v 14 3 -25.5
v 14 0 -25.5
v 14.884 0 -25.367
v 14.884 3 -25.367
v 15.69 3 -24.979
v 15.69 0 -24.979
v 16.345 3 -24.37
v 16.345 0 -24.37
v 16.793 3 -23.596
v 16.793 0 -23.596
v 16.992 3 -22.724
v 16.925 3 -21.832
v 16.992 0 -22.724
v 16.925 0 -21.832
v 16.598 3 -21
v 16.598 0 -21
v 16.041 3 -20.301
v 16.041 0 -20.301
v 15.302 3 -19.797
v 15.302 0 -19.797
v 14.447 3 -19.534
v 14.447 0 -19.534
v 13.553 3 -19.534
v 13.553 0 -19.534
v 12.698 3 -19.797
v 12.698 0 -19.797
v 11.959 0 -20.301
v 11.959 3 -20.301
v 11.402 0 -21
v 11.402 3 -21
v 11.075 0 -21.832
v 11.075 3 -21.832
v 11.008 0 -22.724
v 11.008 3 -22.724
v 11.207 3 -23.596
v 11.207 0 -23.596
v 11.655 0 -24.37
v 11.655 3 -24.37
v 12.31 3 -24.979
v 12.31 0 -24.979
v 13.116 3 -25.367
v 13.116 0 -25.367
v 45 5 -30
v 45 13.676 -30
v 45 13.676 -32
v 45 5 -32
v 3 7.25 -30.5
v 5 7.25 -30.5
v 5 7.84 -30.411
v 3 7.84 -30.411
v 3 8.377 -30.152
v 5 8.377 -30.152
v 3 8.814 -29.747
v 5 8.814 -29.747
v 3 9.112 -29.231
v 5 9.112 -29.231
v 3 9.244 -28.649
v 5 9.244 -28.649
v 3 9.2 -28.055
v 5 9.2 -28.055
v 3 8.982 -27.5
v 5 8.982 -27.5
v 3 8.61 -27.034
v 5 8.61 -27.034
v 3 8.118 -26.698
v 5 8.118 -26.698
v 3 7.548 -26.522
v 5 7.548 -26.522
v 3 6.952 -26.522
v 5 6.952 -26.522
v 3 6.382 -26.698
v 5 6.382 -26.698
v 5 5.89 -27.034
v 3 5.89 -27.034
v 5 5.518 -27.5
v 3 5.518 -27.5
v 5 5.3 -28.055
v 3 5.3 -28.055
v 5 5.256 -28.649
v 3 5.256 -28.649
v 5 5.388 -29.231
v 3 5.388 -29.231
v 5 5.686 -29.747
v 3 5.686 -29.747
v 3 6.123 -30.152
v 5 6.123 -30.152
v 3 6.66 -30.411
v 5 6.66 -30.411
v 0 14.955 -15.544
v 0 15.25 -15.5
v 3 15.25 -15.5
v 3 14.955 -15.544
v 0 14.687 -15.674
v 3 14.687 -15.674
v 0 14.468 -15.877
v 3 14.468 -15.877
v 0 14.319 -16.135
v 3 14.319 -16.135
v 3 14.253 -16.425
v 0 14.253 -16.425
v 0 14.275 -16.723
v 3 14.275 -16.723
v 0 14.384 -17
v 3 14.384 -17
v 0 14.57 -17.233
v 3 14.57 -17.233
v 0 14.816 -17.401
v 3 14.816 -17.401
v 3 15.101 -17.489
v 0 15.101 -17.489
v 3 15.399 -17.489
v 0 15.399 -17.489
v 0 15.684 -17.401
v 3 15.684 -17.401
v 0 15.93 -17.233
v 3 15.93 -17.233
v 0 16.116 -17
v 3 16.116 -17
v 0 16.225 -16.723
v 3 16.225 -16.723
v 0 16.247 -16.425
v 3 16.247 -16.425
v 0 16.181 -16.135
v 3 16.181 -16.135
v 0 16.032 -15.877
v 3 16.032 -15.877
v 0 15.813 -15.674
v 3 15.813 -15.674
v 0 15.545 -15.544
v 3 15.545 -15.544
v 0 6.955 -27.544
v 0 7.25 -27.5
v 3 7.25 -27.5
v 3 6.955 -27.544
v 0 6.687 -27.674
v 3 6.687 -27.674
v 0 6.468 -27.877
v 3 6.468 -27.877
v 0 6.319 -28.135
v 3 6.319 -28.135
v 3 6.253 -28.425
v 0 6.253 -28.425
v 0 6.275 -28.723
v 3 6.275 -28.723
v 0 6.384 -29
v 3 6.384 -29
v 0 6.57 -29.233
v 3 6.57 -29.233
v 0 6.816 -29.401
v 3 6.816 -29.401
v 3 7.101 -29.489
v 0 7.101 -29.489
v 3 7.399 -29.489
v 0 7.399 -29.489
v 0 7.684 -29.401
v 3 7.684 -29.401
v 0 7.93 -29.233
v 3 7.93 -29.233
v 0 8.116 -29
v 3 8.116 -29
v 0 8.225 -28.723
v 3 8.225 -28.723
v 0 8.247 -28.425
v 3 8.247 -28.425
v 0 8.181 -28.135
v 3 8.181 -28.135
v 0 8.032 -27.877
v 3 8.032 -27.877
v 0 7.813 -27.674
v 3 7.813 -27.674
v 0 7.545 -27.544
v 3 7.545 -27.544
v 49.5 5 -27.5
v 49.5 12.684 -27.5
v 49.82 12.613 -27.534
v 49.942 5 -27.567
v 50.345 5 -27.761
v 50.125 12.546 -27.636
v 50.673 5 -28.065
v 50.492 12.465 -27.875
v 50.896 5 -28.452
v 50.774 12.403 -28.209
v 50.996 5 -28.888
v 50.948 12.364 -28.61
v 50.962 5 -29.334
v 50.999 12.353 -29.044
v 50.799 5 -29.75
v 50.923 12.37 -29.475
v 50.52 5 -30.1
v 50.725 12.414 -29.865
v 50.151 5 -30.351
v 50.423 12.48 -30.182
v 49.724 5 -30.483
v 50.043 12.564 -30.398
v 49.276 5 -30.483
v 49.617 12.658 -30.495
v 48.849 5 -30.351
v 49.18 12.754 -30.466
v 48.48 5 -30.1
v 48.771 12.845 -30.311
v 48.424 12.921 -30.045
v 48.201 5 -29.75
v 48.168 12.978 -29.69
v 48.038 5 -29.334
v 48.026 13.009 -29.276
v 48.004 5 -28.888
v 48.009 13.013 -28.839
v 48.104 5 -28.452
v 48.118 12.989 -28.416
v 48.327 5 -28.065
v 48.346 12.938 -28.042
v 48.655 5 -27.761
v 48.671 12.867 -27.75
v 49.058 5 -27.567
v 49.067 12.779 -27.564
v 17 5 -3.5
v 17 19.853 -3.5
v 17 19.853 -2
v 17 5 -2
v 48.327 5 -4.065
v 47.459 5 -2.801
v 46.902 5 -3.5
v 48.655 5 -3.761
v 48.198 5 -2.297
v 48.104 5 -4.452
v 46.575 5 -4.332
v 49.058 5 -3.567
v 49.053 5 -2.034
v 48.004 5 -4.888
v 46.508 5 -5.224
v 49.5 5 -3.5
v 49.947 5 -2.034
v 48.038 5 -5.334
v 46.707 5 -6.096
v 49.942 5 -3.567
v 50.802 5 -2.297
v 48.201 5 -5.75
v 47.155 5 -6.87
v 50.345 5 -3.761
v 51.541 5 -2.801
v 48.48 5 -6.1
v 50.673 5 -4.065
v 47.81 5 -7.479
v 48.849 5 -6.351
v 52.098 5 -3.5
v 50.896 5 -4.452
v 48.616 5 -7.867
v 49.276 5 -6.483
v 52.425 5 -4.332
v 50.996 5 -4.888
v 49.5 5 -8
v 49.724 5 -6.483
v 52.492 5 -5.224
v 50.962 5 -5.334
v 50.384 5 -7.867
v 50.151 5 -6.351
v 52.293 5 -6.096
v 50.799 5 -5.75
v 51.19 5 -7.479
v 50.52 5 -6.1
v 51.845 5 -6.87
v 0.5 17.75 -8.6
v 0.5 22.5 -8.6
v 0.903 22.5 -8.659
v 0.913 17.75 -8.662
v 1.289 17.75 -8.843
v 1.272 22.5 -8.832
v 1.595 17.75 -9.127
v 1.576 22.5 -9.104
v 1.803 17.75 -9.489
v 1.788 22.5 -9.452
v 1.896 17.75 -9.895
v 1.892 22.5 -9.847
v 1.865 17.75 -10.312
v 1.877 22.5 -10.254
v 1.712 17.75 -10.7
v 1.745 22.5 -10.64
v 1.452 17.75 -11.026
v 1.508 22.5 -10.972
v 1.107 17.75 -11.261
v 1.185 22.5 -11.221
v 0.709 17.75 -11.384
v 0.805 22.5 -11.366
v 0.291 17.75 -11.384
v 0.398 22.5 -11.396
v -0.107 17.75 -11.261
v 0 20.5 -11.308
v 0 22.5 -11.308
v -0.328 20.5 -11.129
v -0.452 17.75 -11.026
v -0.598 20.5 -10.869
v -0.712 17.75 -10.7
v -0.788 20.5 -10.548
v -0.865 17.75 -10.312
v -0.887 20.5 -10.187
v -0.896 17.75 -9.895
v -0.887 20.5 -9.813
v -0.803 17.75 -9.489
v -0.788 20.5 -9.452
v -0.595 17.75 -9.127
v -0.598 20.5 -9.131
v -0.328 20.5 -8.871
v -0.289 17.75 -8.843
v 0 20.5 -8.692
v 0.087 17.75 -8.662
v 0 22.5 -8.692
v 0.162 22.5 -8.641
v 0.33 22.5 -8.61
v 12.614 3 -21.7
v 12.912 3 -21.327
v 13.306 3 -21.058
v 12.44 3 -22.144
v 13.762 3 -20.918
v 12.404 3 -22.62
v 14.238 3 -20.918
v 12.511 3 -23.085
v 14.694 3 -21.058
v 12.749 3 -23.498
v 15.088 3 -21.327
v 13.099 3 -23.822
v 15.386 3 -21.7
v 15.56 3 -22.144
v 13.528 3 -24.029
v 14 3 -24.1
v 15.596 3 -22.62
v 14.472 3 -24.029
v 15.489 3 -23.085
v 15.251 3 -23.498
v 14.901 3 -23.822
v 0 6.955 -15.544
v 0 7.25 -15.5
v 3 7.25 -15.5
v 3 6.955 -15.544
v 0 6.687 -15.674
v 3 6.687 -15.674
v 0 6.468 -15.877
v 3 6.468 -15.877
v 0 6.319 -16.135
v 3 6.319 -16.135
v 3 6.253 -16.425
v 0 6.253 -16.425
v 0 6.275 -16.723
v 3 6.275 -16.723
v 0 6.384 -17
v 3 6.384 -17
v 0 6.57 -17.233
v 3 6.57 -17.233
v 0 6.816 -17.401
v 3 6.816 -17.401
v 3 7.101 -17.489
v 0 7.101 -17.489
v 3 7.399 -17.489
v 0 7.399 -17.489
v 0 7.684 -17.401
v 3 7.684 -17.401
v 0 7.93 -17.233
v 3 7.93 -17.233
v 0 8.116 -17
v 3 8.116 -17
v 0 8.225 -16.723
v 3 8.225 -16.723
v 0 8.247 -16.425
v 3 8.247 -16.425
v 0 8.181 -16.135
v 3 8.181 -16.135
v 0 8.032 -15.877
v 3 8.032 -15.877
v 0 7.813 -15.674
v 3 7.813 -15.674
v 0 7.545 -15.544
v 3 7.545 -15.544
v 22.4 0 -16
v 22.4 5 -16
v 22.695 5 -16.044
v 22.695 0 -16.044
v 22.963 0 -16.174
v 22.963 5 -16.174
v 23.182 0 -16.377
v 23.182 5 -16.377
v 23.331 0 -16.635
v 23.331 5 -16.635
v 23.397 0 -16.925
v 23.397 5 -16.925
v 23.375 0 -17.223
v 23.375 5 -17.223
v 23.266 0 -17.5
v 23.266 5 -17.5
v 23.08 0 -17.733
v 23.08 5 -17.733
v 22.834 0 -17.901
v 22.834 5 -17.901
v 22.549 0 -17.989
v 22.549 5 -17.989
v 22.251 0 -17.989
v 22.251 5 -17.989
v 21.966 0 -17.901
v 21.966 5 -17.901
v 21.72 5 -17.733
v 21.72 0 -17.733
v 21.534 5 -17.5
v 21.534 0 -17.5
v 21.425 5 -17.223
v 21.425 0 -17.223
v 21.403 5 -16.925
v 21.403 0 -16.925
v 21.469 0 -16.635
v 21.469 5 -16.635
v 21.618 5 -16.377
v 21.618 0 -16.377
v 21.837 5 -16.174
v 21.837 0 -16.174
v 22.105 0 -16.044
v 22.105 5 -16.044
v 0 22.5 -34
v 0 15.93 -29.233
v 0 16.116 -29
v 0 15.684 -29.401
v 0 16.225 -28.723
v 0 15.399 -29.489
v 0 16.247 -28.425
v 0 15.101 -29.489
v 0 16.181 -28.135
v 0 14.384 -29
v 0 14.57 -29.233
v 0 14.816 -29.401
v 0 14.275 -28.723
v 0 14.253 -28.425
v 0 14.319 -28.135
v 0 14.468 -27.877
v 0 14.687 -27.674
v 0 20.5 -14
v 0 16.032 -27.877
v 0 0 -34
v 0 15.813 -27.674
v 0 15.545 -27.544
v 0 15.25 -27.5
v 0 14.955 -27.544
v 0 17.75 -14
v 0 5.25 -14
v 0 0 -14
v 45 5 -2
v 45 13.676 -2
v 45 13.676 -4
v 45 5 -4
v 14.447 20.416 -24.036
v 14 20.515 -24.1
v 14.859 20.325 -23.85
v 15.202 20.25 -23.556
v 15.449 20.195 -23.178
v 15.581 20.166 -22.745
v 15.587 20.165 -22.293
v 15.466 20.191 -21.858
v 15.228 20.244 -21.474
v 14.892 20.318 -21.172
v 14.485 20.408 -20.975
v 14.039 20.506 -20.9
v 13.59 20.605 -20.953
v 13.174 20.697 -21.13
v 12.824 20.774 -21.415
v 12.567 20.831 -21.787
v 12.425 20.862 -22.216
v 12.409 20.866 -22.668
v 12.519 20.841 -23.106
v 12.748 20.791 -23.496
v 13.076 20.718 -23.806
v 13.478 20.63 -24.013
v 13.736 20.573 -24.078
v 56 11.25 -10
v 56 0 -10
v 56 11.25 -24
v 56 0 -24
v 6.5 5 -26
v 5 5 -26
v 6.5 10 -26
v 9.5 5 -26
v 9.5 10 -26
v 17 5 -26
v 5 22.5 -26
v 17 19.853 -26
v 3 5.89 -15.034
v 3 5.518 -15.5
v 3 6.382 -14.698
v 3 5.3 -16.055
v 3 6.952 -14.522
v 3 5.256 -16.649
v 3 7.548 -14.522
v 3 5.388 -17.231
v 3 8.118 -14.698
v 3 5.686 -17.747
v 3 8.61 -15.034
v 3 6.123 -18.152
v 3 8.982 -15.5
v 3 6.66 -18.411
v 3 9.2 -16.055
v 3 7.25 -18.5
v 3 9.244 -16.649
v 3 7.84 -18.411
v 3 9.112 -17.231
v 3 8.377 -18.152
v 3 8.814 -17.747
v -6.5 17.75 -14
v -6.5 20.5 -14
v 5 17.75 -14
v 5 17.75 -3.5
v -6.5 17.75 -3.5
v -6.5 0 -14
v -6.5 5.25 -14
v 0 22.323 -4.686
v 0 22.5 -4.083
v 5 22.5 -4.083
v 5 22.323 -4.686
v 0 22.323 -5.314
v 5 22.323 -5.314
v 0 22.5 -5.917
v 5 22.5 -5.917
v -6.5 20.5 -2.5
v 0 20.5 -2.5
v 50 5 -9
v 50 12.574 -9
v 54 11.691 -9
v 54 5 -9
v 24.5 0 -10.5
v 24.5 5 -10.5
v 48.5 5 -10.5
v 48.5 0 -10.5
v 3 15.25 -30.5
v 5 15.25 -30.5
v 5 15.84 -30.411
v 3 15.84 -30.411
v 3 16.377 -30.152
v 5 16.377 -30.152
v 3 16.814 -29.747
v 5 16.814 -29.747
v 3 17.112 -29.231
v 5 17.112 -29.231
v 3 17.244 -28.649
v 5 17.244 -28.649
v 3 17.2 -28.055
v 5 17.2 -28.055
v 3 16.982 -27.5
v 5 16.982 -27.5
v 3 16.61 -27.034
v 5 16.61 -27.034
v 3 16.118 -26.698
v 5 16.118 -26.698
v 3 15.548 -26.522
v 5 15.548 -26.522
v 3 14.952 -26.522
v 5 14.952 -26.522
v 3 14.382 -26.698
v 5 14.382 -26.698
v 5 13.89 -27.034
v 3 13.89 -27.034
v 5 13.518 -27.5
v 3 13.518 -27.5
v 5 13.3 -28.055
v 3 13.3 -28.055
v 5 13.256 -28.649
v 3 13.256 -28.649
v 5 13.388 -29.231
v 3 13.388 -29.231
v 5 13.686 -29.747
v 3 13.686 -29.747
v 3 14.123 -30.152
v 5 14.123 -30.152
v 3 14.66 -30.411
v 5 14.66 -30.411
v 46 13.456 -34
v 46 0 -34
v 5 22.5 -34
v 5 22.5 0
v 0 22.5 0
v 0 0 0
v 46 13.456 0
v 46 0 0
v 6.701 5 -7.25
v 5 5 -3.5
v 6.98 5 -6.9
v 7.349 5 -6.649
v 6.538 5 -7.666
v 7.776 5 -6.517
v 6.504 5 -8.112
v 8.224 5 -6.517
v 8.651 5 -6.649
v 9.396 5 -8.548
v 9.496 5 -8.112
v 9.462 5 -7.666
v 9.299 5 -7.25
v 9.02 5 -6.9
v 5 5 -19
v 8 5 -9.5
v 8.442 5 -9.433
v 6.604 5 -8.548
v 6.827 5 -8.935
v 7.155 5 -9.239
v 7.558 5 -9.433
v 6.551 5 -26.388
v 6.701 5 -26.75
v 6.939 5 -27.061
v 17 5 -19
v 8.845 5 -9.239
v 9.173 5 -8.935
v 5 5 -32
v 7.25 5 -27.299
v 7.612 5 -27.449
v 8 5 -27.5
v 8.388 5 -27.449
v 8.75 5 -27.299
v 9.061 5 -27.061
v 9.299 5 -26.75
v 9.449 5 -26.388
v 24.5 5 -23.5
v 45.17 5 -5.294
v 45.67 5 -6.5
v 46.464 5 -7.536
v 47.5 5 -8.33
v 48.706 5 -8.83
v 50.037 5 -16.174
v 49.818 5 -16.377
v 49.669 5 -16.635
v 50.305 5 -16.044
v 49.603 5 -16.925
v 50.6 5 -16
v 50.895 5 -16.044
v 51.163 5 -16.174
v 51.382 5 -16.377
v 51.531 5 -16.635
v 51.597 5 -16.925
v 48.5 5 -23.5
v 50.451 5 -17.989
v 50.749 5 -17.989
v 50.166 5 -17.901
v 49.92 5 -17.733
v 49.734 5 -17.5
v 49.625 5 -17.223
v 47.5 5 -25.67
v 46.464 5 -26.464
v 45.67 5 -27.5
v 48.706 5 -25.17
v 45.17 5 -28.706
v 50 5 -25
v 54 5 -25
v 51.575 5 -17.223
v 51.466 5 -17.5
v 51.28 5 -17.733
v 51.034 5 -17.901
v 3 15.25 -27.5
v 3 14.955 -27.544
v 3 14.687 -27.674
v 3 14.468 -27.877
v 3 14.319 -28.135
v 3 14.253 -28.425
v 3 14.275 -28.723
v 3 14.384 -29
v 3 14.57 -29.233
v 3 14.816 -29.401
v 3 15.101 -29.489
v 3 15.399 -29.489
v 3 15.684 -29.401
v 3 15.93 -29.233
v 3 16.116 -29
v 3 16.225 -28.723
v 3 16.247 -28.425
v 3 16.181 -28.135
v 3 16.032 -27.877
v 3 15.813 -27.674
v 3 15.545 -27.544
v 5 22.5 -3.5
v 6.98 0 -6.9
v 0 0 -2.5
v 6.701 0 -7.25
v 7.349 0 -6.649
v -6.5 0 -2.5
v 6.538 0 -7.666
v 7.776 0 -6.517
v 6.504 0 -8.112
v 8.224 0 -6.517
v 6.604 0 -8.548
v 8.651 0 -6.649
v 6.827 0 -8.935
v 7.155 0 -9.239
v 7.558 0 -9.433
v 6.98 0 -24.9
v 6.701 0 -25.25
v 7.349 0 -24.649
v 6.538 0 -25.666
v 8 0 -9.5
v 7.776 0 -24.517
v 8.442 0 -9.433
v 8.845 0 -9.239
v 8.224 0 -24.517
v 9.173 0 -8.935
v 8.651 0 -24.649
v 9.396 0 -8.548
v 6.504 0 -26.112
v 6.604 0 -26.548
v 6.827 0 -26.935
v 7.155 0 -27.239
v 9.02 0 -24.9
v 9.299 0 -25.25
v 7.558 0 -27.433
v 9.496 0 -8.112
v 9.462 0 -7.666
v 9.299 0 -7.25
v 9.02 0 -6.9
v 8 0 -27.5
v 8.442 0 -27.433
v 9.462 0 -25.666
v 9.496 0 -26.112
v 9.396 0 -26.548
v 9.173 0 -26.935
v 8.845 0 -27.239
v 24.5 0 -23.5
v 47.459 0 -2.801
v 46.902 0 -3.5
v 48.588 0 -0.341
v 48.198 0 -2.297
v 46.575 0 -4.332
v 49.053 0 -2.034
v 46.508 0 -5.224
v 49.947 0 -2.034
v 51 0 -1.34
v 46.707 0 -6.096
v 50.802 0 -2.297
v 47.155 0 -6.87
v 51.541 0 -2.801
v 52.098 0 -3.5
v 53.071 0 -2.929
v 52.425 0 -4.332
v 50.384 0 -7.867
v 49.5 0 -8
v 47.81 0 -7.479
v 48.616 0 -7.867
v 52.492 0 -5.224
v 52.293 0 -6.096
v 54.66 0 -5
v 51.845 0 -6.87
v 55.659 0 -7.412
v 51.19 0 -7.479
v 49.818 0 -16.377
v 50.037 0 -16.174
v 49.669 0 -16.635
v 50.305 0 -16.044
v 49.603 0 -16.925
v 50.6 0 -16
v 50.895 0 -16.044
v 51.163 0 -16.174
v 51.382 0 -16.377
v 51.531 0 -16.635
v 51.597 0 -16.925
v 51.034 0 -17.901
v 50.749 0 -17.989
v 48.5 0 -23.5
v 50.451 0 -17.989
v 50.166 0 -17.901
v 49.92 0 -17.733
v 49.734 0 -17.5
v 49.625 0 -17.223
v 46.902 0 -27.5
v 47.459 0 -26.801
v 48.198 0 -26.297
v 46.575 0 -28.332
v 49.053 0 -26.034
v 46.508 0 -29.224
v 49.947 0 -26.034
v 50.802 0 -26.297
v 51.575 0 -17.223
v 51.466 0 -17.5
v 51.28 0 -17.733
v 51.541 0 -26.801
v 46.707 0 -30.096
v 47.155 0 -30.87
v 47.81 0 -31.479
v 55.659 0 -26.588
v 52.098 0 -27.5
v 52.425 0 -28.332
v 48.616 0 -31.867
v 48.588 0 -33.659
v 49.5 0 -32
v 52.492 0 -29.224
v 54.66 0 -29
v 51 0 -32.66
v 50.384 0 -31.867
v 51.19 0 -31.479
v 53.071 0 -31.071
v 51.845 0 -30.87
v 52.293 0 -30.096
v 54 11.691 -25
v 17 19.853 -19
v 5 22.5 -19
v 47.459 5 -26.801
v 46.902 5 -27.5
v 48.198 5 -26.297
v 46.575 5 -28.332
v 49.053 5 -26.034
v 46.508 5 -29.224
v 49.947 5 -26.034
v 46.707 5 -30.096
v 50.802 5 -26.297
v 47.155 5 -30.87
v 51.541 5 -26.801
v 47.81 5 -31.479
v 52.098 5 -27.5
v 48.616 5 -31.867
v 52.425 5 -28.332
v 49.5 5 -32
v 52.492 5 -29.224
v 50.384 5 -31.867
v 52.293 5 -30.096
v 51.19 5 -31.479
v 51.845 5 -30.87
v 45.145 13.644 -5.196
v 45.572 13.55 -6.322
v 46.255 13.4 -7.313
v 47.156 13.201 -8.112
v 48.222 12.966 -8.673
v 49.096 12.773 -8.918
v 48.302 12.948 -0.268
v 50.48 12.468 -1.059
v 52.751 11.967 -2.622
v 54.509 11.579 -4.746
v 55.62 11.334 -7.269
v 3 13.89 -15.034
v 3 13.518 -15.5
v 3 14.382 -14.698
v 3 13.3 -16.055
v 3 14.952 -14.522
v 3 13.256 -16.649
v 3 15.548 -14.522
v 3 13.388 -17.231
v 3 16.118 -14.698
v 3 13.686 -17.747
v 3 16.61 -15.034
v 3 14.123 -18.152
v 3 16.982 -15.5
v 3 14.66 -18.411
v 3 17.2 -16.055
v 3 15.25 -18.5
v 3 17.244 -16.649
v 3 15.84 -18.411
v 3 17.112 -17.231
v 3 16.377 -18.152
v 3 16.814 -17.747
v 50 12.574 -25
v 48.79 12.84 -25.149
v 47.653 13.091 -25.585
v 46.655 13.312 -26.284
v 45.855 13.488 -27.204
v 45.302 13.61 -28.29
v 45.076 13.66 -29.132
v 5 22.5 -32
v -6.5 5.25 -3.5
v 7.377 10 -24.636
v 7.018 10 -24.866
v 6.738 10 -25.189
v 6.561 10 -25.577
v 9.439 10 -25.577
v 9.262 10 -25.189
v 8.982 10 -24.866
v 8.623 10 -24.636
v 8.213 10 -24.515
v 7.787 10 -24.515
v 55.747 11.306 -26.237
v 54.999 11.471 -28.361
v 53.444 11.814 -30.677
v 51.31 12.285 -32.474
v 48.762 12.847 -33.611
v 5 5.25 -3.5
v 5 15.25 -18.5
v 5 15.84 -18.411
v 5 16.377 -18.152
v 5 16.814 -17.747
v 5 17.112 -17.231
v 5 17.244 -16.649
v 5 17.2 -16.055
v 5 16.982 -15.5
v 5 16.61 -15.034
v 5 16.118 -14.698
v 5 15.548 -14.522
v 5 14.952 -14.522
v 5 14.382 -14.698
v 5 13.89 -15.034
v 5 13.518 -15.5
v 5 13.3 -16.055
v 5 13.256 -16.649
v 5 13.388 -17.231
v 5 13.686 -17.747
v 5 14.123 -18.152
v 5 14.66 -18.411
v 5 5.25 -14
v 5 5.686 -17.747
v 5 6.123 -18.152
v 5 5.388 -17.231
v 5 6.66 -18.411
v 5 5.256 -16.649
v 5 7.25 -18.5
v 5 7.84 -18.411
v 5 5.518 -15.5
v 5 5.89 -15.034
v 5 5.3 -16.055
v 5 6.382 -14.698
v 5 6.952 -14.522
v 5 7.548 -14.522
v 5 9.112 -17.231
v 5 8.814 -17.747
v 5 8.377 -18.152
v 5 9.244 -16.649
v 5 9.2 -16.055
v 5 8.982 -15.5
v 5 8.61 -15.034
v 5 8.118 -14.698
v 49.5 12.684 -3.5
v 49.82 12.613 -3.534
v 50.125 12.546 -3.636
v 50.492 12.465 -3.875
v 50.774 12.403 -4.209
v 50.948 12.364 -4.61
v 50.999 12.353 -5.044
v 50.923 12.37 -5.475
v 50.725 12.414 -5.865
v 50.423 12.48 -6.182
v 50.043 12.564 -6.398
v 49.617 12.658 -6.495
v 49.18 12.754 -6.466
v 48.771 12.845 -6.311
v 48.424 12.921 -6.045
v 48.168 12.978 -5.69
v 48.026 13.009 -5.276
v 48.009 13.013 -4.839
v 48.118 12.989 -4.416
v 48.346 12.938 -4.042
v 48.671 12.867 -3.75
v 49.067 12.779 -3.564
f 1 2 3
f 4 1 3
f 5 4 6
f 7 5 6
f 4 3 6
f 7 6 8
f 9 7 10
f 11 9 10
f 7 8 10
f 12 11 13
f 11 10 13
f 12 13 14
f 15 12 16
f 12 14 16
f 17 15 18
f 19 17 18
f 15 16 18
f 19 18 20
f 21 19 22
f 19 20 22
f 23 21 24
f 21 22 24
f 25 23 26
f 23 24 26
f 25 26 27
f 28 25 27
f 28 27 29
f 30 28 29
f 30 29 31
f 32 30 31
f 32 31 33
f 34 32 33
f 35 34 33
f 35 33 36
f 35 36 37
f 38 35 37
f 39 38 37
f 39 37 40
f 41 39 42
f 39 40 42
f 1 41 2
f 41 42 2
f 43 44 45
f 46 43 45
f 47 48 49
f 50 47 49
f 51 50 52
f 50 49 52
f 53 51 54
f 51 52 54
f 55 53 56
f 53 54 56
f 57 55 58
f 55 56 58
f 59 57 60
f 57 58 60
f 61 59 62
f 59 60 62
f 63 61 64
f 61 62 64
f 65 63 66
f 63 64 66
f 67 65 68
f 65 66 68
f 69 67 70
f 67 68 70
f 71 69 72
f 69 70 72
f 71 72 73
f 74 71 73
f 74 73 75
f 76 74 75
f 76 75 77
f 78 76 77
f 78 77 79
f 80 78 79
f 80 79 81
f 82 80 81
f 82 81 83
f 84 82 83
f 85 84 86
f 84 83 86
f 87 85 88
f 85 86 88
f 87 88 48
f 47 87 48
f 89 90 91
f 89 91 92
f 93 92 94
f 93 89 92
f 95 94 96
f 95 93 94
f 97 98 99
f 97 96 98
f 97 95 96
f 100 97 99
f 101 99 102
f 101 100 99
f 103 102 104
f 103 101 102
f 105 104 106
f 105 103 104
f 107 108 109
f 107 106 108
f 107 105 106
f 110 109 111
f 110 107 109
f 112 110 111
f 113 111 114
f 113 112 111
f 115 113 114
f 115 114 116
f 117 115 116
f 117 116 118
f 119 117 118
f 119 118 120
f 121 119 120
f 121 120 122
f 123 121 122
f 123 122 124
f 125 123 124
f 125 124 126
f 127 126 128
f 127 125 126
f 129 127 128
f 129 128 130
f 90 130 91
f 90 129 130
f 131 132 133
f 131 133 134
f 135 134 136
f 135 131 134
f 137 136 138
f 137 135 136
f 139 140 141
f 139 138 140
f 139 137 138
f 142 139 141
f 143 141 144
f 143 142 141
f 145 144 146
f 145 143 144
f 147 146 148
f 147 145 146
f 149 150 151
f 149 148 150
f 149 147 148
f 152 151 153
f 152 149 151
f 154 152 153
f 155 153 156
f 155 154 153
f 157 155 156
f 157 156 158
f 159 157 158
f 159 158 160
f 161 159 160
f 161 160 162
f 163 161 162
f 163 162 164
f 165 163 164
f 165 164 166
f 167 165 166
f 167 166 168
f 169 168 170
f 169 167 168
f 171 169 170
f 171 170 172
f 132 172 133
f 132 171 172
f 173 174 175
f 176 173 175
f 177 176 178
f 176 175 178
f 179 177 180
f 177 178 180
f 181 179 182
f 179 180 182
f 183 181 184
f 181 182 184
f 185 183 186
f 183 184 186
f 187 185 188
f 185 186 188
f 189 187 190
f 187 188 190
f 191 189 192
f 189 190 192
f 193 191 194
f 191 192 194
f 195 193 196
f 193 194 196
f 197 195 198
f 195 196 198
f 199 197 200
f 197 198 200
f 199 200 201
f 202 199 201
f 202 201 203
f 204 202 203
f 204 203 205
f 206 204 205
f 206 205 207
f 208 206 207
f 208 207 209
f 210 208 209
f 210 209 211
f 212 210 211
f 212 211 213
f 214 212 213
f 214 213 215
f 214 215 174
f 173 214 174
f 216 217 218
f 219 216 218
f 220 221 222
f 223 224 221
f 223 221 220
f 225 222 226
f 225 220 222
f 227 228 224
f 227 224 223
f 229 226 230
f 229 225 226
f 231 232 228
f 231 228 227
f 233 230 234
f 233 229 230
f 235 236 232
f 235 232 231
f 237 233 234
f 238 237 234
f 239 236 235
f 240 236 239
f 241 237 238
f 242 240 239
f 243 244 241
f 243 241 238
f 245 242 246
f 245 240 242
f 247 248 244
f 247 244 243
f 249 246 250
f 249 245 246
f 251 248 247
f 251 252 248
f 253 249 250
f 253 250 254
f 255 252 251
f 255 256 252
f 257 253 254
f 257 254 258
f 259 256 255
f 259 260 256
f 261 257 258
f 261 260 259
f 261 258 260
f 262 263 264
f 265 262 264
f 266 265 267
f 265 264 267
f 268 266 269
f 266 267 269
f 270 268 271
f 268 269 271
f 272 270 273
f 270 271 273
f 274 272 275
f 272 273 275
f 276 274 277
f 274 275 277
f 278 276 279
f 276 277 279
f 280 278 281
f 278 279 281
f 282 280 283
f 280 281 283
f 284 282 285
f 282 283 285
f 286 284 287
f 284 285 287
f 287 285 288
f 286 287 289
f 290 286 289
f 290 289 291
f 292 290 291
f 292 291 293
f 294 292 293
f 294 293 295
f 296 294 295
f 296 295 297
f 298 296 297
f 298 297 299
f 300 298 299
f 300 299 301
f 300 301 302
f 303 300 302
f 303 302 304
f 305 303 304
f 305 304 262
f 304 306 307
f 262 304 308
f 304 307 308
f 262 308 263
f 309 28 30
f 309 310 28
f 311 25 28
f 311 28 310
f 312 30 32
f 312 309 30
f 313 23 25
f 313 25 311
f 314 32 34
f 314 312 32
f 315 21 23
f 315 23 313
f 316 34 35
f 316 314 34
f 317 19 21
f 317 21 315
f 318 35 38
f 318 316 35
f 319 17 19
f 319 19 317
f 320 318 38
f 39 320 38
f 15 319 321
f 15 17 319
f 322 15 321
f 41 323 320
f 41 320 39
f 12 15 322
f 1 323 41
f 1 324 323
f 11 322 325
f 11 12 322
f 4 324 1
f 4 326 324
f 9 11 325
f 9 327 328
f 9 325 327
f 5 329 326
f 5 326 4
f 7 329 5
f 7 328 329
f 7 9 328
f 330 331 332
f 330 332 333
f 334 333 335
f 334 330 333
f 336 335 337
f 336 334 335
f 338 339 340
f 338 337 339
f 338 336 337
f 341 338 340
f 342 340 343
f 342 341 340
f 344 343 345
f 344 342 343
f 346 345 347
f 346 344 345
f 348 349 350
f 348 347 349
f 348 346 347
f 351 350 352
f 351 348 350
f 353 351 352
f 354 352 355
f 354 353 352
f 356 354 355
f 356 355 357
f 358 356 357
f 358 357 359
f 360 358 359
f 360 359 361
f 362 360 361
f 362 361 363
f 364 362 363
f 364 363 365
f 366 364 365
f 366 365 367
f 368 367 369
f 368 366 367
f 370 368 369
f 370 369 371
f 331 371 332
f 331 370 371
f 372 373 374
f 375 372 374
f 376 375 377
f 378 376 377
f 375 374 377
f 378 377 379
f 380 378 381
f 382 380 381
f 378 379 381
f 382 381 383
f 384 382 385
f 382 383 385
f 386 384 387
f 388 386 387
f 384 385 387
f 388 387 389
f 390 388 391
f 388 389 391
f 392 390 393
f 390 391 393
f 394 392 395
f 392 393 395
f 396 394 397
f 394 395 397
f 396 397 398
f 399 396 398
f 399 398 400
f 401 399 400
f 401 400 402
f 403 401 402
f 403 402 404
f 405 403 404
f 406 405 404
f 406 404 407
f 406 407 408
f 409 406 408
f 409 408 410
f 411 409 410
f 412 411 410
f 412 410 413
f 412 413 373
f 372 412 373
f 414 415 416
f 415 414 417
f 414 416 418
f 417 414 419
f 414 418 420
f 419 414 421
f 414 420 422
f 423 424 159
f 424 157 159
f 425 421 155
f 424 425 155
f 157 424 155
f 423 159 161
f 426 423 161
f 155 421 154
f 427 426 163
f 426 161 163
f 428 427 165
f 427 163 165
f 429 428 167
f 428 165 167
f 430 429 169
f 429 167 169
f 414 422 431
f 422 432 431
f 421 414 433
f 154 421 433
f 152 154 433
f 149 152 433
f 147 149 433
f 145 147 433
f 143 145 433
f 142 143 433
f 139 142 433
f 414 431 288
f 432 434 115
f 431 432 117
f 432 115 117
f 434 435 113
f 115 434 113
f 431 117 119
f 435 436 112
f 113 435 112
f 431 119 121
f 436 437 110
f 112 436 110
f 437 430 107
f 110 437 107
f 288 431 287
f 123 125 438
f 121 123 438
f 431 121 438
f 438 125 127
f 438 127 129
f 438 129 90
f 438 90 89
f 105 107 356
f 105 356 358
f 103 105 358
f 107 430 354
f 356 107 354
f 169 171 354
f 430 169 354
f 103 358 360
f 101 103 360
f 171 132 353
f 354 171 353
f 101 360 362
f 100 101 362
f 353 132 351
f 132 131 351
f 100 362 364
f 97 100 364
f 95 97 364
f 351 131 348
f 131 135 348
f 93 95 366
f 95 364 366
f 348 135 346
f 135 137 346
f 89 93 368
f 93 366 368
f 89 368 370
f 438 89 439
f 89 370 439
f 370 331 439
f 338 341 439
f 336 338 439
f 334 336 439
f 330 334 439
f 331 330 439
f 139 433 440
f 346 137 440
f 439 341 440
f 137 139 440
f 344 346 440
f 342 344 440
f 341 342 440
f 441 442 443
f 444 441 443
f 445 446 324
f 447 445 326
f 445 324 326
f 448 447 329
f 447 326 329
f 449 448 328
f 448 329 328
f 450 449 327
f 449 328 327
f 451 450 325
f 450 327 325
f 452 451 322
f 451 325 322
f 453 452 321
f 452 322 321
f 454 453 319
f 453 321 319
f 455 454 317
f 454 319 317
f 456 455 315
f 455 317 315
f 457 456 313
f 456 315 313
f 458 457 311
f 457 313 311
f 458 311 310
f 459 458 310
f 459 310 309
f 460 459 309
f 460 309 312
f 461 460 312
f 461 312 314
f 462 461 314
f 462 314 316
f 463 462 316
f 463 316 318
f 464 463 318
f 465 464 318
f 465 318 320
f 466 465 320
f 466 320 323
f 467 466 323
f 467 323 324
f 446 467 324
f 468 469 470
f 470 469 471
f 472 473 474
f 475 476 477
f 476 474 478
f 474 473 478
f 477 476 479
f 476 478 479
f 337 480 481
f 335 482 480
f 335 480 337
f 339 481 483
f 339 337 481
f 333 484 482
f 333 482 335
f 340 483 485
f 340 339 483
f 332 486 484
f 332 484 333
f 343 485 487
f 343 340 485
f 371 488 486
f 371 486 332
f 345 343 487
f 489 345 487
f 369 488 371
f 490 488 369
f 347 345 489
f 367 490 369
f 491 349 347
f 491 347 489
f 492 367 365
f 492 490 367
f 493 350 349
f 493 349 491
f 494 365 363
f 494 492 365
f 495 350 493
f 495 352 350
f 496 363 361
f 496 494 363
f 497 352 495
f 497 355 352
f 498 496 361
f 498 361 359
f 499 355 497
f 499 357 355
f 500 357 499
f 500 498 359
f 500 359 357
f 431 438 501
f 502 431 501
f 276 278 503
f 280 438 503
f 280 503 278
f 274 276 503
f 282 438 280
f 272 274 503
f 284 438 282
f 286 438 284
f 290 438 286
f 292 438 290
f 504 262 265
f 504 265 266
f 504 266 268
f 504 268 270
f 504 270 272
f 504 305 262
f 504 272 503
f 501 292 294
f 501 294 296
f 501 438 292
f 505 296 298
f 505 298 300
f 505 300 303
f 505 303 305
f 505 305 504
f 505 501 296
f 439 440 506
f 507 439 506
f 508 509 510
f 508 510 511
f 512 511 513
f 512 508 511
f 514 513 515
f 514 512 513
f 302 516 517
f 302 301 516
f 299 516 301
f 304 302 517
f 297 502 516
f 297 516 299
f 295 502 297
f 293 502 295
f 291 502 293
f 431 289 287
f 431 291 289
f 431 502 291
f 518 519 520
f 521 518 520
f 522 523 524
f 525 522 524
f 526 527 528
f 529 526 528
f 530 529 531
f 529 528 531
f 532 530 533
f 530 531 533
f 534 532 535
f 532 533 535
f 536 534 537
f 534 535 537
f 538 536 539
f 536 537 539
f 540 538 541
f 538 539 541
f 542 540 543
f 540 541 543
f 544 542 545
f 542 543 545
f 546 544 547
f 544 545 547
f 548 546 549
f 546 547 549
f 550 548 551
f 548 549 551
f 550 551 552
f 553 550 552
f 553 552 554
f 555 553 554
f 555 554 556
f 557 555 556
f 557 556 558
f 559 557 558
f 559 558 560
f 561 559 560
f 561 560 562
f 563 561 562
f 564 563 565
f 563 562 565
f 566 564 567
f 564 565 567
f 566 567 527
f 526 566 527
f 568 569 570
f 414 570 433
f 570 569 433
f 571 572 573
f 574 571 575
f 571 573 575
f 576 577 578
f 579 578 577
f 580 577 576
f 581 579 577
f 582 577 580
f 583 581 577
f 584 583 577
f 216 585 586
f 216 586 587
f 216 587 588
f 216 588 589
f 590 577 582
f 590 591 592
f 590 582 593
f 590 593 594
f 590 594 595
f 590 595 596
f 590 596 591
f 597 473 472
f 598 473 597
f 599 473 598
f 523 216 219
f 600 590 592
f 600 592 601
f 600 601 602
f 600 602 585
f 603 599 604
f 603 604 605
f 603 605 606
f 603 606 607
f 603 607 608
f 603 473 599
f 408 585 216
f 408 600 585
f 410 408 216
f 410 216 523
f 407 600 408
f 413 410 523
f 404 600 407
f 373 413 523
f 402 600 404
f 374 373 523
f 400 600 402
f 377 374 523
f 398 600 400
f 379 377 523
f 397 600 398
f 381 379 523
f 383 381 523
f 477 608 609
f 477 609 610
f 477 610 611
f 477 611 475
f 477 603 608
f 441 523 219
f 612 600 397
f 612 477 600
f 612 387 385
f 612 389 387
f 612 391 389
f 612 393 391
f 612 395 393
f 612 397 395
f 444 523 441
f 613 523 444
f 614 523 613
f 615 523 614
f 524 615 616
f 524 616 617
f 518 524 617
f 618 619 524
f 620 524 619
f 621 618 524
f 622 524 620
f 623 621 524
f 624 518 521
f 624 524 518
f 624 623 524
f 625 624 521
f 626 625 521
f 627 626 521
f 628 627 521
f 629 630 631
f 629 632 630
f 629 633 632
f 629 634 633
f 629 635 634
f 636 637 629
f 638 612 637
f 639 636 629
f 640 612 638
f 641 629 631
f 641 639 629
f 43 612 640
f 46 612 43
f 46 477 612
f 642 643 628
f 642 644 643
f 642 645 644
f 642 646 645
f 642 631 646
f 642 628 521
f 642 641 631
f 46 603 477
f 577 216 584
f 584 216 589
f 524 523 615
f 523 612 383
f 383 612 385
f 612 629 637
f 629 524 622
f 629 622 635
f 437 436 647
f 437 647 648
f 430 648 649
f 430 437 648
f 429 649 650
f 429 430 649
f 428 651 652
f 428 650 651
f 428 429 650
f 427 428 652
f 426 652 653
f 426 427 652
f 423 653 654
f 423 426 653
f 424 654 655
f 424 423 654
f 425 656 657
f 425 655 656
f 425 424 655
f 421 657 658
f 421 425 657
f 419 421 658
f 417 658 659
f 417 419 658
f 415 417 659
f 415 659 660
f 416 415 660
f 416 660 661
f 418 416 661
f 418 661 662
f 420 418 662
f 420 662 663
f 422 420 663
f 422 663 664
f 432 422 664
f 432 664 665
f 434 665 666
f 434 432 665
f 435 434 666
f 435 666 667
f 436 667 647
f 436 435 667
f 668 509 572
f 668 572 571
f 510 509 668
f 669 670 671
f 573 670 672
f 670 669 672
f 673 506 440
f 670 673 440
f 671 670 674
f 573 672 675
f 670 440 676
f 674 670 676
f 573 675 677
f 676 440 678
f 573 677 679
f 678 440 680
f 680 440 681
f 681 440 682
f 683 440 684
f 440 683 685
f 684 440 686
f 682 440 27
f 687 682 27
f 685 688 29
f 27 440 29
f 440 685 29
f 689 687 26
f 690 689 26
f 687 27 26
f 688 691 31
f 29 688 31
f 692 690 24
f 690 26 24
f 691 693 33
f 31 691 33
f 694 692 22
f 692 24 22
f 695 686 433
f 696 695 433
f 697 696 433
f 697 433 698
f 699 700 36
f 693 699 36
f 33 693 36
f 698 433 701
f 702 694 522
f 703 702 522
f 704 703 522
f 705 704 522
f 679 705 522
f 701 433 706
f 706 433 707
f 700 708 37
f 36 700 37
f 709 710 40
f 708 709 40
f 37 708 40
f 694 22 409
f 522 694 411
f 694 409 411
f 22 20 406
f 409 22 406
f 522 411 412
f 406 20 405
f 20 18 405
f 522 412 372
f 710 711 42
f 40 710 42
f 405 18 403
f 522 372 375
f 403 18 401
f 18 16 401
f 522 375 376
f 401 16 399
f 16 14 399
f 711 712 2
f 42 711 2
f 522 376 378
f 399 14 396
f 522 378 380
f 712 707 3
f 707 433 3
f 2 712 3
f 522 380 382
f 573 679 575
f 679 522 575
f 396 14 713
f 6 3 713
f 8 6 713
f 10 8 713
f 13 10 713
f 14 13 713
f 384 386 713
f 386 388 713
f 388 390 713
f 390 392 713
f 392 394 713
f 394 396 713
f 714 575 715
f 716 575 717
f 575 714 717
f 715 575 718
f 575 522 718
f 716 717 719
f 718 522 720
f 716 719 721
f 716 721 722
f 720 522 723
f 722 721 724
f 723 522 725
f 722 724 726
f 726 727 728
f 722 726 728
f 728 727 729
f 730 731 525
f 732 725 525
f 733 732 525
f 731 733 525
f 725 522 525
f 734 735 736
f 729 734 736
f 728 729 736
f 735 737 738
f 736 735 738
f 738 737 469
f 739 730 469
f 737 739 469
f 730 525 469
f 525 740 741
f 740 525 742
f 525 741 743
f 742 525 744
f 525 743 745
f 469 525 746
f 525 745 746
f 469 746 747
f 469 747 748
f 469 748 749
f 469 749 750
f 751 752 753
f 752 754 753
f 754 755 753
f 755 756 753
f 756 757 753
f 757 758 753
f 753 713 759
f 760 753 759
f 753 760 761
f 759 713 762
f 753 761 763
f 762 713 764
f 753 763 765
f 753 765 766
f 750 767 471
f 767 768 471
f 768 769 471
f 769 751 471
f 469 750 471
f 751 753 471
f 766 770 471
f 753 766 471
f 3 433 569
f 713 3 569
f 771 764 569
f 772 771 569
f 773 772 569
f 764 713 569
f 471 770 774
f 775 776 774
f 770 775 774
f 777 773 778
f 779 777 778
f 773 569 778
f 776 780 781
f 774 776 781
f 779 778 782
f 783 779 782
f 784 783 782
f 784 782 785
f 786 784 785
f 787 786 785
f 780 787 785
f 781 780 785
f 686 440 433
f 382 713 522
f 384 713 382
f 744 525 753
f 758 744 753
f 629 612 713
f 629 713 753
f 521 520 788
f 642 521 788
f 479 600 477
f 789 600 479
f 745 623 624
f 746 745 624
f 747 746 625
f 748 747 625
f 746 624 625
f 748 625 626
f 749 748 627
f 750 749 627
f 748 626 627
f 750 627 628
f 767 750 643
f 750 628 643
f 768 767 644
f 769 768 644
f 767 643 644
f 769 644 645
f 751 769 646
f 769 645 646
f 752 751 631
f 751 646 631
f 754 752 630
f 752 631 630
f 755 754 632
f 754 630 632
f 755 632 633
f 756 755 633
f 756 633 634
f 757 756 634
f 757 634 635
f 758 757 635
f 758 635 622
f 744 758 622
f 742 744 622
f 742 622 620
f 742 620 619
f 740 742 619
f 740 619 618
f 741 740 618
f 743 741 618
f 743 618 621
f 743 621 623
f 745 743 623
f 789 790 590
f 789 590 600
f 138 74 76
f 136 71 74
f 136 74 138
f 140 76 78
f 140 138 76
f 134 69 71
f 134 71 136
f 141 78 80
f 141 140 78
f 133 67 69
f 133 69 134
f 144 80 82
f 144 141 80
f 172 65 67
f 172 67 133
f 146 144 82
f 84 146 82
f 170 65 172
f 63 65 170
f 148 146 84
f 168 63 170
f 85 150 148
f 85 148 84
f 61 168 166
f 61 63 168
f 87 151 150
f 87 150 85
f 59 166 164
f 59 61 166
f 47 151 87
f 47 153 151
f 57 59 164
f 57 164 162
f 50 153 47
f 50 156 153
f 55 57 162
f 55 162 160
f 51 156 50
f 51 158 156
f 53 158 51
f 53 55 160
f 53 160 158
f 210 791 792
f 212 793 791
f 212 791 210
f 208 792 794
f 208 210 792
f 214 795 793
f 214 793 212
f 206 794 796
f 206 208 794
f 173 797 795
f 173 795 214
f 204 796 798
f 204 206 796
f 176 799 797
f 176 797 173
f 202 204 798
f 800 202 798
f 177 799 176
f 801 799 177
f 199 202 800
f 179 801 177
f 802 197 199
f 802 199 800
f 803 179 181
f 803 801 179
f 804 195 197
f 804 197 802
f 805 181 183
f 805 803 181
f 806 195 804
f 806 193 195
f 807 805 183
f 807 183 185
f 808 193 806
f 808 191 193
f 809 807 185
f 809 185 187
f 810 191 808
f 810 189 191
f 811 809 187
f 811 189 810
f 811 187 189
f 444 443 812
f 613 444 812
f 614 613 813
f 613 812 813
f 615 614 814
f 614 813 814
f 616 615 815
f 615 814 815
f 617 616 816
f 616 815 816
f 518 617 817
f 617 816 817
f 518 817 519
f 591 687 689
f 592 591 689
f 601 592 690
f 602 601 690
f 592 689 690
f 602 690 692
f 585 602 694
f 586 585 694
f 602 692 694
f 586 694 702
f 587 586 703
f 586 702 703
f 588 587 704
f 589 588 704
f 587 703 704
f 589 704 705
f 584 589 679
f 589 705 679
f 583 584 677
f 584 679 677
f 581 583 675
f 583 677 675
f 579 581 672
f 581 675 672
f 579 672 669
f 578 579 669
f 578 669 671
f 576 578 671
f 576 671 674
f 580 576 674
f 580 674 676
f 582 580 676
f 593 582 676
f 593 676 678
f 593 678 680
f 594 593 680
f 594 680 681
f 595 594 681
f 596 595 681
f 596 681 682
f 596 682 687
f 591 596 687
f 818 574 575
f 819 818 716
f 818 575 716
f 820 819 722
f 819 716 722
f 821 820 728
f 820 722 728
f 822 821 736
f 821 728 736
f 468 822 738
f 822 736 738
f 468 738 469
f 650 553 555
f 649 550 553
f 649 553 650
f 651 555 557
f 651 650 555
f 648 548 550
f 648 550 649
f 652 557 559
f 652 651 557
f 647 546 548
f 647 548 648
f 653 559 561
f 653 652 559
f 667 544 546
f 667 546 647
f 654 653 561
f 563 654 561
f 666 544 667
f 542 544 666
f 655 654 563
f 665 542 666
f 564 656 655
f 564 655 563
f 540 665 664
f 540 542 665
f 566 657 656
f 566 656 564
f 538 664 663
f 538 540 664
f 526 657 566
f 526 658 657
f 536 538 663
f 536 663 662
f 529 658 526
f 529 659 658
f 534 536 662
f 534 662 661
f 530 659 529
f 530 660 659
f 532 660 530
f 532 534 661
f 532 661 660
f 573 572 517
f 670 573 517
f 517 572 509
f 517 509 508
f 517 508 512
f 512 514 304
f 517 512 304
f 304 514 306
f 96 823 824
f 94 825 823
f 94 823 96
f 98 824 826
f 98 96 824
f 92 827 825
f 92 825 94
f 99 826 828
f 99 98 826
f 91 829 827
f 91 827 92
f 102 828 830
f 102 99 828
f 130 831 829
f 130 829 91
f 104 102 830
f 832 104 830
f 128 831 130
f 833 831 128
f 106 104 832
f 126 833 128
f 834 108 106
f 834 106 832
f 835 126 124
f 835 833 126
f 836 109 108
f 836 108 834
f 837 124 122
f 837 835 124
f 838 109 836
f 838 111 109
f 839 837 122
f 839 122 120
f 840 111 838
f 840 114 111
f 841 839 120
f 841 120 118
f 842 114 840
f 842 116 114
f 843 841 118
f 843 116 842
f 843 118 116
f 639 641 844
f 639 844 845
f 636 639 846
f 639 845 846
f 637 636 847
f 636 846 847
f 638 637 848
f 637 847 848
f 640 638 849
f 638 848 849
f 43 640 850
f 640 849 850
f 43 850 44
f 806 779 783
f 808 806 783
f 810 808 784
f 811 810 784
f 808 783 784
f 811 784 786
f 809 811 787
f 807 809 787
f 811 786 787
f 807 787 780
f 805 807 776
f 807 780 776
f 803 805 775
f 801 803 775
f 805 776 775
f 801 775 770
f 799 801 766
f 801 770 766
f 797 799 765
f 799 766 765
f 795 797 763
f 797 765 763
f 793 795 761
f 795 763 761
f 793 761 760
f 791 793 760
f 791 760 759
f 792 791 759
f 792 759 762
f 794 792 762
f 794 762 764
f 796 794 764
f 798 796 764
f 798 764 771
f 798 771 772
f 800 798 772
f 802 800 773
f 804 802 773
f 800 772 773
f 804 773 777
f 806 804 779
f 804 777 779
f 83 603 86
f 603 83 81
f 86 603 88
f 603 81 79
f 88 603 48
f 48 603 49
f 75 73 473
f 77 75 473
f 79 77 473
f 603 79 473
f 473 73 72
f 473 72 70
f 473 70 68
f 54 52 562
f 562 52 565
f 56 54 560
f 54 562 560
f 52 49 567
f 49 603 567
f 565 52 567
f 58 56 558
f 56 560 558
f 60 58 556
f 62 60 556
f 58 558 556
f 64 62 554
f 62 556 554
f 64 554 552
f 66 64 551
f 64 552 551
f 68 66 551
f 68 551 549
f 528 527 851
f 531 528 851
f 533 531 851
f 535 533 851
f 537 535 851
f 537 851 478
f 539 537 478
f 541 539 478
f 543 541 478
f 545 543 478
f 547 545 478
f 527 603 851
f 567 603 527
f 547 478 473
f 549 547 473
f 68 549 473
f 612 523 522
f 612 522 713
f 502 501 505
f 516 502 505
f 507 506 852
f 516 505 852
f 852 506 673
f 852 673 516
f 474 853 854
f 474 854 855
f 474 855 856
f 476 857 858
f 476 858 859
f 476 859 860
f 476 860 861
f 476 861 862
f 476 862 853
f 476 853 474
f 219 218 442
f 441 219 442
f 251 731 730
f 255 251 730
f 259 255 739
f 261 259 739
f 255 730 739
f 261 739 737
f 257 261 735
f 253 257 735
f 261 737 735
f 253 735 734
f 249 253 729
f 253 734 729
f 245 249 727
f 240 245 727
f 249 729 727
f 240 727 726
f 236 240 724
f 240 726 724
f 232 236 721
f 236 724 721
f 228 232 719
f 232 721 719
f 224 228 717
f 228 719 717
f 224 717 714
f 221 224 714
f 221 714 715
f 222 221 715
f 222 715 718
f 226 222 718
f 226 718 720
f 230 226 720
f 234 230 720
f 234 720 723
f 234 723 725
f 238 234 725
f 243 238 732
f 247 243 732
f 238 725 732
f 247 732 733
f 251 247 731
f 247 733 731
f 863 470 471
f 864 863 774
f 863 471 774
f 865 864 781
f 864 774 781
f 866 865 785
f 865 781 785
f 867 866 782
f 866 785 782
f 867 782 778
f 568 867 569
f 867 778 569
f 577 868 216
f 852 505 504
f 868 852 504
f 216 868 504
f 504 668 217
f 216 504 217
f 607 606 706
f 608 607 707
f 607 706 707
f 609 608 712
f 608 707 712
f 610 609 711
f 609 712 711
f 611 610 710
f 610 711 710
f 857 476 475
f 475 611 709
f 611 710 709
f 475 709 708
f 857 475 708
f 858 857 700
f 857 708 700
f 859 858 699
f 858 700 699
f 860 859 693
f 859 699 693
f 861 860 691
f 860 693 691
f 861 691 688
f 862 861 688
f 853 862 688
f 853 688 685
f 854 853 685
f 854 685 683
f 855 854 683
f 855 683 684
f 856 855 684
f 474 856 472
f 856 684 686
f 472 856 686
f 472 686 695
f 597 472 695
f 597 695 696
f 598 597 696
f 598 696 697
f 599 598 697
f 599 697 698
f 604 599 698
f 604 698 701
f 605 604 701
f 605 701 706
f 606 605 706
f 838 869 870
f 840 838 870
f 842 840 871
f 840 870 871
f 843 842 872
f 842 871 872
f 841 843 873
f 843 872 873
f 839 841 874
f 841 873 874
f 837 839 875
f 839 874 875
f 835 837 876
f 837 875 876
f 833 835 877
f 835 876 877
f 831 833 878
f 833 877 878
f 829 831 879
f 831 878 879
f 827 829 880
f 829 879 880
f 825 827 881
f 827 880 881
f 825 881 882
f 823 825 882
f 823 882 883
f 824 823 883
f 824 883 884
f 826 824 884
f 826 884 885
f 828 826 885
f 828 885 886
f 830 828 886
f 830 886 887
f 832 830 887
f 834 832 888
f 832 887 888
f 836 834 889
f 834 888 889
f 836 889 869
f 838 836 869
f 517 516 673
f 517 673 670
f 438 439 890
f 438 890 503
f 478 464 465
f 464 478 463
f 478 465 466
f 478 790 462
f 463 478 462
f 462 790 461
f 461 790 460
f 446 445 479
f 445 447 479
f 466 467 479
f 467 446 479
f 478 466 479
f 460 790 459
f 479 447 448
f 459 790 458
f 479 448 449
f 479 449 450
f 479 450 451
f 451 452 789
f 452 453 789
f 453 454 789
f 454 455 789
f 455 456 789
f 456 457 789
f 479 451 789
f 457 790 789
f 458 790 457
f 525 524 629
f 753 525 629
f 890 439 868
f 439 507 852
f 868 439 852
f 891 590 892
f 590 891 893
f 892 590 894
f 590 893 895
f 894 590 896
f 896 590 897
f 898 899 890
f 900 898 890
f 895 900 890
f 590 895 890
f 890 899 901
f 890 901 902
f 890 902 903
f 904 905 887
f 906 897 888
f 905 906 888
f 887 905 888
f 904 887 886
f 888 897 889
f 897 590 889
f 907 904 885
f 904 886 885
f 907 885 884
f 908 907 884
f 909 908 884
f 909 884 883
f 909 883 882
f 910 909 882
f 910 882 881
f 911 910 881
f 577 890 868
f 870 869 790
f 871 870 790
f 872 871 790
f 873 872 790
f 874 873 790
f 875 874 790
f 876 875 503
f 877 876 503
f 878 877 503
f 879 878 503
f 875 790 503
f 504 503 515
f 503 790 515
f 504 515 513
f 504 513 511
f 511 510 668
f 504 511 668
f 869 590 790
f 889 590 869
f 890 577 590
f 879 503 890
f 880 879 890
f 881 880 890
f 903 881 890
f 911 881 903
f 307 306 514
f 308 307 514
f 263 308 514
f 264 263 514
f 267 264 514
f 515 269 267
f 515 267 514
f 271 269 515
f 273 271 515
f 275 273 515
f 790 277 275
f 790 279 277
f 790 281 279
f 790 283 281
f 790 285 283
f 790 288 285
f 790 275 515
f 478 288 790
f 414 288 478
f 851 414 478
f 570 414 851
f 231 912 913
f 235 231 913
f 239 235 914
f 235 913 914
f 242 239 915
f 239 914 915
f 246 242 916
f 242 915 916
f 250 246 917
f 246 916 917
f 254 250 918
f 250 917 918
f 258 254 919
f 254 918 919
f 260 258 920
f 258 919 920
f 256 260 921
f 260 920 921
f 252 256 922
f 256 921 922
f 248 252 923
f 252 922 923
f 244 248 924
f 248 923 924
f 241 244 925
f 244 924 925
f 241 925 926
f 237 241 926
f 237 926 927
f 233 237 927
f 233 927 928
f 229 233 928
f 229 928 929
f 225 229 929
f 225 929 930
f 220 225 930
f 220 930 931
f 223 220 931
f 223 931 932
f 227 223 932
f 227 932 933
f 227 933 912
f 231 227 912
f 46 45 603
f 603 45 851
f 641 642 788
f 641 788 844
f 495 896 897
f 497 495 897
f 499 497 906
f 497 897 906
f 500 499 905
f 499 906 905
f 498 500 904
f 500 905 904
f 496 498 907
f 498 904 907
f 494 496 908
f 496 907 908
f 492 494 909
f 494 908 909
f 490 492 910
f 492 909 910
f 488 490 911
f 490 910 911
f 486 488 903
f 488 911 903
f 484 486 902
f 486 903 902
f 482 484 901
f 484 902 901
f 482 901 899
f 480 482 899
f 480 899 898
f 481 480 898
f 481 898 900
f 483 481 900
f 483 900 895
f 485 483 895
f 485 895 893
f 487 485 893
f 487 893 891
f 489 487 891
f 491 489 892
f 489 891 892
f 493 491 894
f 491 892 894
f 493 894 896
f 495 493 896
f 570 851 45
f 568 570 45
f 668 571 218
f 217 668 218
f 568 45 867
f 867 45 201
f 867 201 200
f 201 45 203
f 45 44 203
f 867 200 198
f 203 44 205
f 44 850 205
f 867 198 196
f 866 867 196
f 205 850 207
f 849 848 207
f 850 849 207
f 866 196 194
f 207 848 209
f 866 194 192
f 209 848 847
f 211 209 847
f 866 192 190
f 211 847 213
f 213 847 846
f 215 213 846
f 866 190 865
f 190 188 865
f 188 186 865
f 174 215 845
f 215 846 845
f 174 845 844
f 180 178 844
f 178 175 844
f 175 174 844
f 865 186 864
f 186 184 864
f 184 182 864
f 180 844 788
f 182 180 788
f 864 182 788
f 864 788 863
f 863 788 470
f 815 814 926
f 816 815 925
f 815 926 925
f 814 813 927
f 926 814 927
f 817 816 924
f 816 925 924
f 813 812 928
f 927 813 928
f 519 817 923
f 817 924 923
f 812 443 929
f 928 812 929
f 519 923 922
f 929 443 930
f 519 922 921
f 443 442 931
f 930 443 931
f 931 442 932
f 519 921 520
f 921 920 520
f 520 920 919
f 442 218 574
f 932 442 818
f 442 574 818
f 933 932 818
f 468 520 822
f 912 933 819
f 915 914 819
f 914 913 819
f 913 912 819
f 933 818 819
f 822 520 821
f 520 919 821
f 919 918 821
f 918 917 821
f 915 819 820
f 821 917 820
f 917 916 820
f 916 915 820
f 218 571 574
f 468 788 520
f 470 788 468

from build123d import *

# Parameters (mm, degrees)
BOSS_EXTRUDE1_DEPTH     = 22.5
CUT_EXTRUDE1_DEPTH      = 17.5
CUT_EXTRUDE2_DEPTH      = 15
CUT_EXTRUDE2_DEPTH_BACK = 66.29356783
SKETCH4_R               = 1
SKETCH5_W               = 10.5
SKETCH5_H               = 12.5
CUT_EXTRUDE3_DEPTH      = 20
SKETCH6_R               = 1.4
CUT_EXTRUDE4_DEPTH      = 10
SKETCH8_R               = 1
SKETCH8_W               = 24
SKETCH8_H               = 13
CUT_EXTRUDE6_DEPTH      = 68.810397433
SKETCH9_R               = 1.5
CUT_EXTRUDE7_DEPTH      = 70.269401614
SKETCH10_R              = 3
CUT_EXTRUDE8_DEPTH      = 5
SKETCH14_W              = 12
SKETCH14_H              = 17.5
BOSS_EXTRUDE3_DEPTH     = 3.5
SKETCH11_R              = 1.5
CUT_EXTRUDE9_DEPTH      = 10
SKETCH16_R              = 2
CUT_EXTRUDE11_DEPTH     = 2
SKETCH18_W              = 6.5
SKETCH18_H              = 2.5
CUT_EXTRUDE12_DEPTH     = 70.269401614
CUT_EXTRUDE14_DEPTH     = 70.269401614
SKETCH22_R              = 1.6
CUT_EXTRUDE15_DEPTH     = 70.269401614
SKETCH23_R              = 3
CUT_EXTRUDE18_DEPTH     = 3
CUT_EXTRUDE19_DEPTH     = 10
SKETCH25_W              = 6.5
SKETCH25_H              = 11.5
CUT_EXTRUDE20_DEPTH     = 2


with BuildPart() as part:
    # Sketch2 → Boss-Extrude1 (new body)
    with BuildSketch(Plane(origin=(0, 0, 0), x_dir=(1, 0, 0), z_dir=(0, 1, 0))):
        with BuildLine():
            Line((0, 0), (46, 0))
            ThreePointArc((46, 0), (53.071067812, 2.928932188), (56, 10))
            Line((56, 10), (56, 24))
            ThreePointArc((56, 24), (53.071067812, 31.071067812), (46, 34))
            Line((46, 34), (0, 34))
            Line((0, 34), (0, 14))
            Line((0, 14), (-6.5, 14))
            Line((-6.5, 14), (-6.5, 0))
            Line((-6.5, 0), (0, 0))
        make_face()
    extrude(amount=BOSS_EXTRUDE1_DEPTH)

    # Sketch3 → Cut-Extrude1 (cut)
    with BuildSketch(Plane(origin=(0, 22.5, 0), x_dir=(1, 0, 0), z_dir=(0, 1, 0))):
        with BuildLine():
            Line((45, 32), (5, 32))
            Line((5, 32), (5, 3.5))
            Line((5, 3.5), (17, 3.5))
            Line((17, 3.5), (17, 2))
            Line((17, 2), (45, 2))
            Line((45, 2), (45, 4))
            ThreePointArc((45, 4), (46.464466094, 7.535533906), (50, 9))
            Line((50, 9), (54, 9))
            Line((54, 9), (54, 25))
            Line((54, 25), (50, 25))
            ThreePointArc((50, 25), (46.464466094, 26.464466094), (45, 30))
            Line((45, 30), (45, 32))
        make_face()
    extrude(amount=-CUT_EXTRUDE1_DEPTH, mode=Mode.SUBTRACT)

    # Sketch4 → Cut-Extrude2 (cut, two sides: drawn at the far end of the back side and taken through both)
    with BuildSketch(Plane(origin=(5, 0, 0), x_dir=(0, 0, -1), z_dir=(1, 0, 0)).offset(-CUT_EXTRUDE2_DEPTH_BACK)):
        with Locations(Location((28.5, 15.25, 0), (0, 0, 180))):
            Circle(SKETCH4_R)
        with Locations(Location((28.5, 7.25, 0), (0, 0, 180))):
            Circle(SKETCH4_R)
        with Locations(Location((16.5, 7.25, 0), (0, 0, 180))):
            Circle(SKETCH4_R)
        with Locations(Location((16.5, 15.25, 0), (0, 0, 180))):
            Circle(SKETCH4_R)
    extrude(amount=CUT_EXTRUDE2_DEPTH + CUT_EXTRUDE2_DEPTH_BACK, mode=Mode.SUBTRACT)

    # Sketch5 → Cut-Extrude3 (cut)
    with BuildSketch(Plane.ZY.offset(6.5)):
        with Locations((-8.75, 11.5)):
            Rectangle(SKETCH5_W, SKETCH5_H)
    extrude(amount=-CUT_EXTRUDE3_DEPTH, mode=Mode.SUBTRACT)

    # Sketch6 → Cut-Extrude4 (cut)
    with BuildSketch(Plane(origin=(0, 22.5, 0), x_dir=(1, 0, 0), z_dir=(0, 1, 0))):
        with Locations(Location((0.5, 10, 0), (0, 0, 270))):
            Circle(SKETCH6_R)
    extrude(amount=-CUT_EXTRUDE4_DEPTH, mode=Mode.SUBTRACT)

    # Sketch8 → Cut-Extrude6 (cut, through all)
    with BuildSketch(Plane(origin=(0, 5, 0), x_dir=(1, 0, 0), z_dir=(0, 1, 0))):
        with Locations(Location((50.6, 17, 0), (0, 0, 270))):
            Circle(SKETCH8_R)
        with Locations(Location((22.4, 17, 0), (0, 0, 270))):
            Circle(SKETCH8_R)
        with Locations((36.5, 17)):
            Rectangle(SKETCH8_W, SKETCH8_H)
    extrude(amount=-CUT_EXTRUDE6_DEPTH, mode=Mode.SUBTRACT)

    # Sketch9 → Cut-Extrude7 (cut, through all)
    with BuildSketch(Plane(origin=(0, 22.5, 0), x_dir=(1, 0, 0), z_dir=(0, 1, 0))):
        with Locations(Location((49.5, 29, 0), (0, 0, 270))):
            Circle(SKETCH9_R)
        with Locations(Location((49.5, 5, 0), (0, 0, 270))):
            Circle(SKETCH9_R)
    extrude(amount=-CUT_EXTRUDE7_DEPTH, mode=Mode.SUBTRACT)

    # Sketch10 → Cut-Extrude8 (cut)
    with BuildSketch(Plane.XZ):
        with Locations(Location((49.5, -5, 0), (0, 0, 270))):
            Circle(SKETCH10_R)
        with Locations(Location((49.5, -29, 0), (0, 0, 270))):
            Circle(SKETCH10_R)
    extrude(amount=-CUT_EXTRUDE8_DEPTH, mode=Mode.SUBTRACT)

    # Sketch14 → Boss-Extrude3 (add, symmetric)
    with BuildSketch(Plane.XY.offset(-22.5)):
        with Locations((11, 13.75)):
            Rectangle(SKETCH14_W, SKETCH14_H)
    extrude(amount=BOSS_EXTRUDE3_DEPTH, both=True)

    # Sketch11 → Cut-Extrude9 (cut)
    with BuildSketch(Plane.XZ):
        with Locations(Location((8, -8, 0), (0, 0, 270))):
            Circle(SKETCH11_R)
        with Locations(Location((8, -26, 0), (0, 0, 270))):
            Circle(SKETCH11_R)
    extrude(amount=-CUT_EXTRUDE9_DEPTH, mode=Mode.SUBTRACT)

    # Sketch16 → Cut-Extrude11 (cut)
    with BuildSketch(Plane(origin=(5, 0, 0), x_dir=(0, 0, -1), z_dir=(1, 0, 0))):
        with Locations((28.5, 15.25)):
            Circle(SKETCH16_R)
        with Locations((28.5, 7.25)):
            Circle(SKETCH16_R)
        with Locations((16.5, 7.25)):
            Circle(SKETCH16_R)
        with Locations((16.5, 15.25)):
            Circle(SKETCH16_R)
    extrude(amount=-CUT_EXTRUDE11_DEPTH, mode=Mode.SUBTRACT)

    # Sketch18 → Cut-Extrude12 (cut, through all)
    with BuildSketch(Plane(origin=(0, 22.5, 0), x_dir=(1, 0, 0), z_dir=(0, 1, 0))):
        with Locations((-3.25, 1.25)):
            Rectangle(SKETCH18_W, SKETCH18_H)
    extrude(amount=-CUT_EXTRUDE12_DEPTH, mode=Mode.SUBTRACT)

    # Sketch21 → Cut-Extrude14 (cut, through all)
    with BuildSketch(Plane.XY):
        Polygon((5, 22.5), (56, 11.25), (56, 22.5), align=None)
    extrude(amount=-CUT_EXTRUDE14_DEPTH, mode=Mode.SUBTRACT)

    # Sketch22 → Cut-Extrude15 (cut, through all)
    with BuildSketch(Plane.XZ):
        with Locations(Location((14, -22.5, 0), (0, 0, 270))):
            Circle(SKETCH22_R)
    extrude(amount=-CUT_EXTRUDE15_DEPTH, mode=Mode.SUBTRACT)

    # Sketch23 → Cut-Extrude18 (cut)
    with BuildSketch(Plane.XZ):
        with Locations(Location((14, -22.5, 0), (0, 0, 270))):
            Circle(SKETCH23_R)
    extrude(amount=-CUT_EXTRUDE18_DEPTH, mode=Mode.SUBTRACT)

    # Sketch26 → Cut-Extrude19 (cut)
    with BuildSketch(Plane.ZY):
        with BuildLine():
            Line((-5.916515139, 22.5), (-4.083484861, 22.5))
            ThreePointArc((-4.083484861, 22.5), (-5, 22.3), (-5.916515139, 22.5))
        make_face()
    extrude(amount=-CUT_EXTRUDE19_DEPTH, mode=Mode.SUBTRACT)

    # Sketch25 → Cut-Extrude20 (cut)
    with BuildSketch(Plane(origin=(0, 22.5, 0), x_dir=(1, 0, 0), z_dir=(0, 1, 0))):
        with Locations((-3.25, 8.25)):
            Rectangle(SKETCH25_W, SKETCH25_H)
    extrude(amount=-CUT_EXTRUDE20_DEPTH, mode=Mode.SUBTRACT)


solid = part.part
